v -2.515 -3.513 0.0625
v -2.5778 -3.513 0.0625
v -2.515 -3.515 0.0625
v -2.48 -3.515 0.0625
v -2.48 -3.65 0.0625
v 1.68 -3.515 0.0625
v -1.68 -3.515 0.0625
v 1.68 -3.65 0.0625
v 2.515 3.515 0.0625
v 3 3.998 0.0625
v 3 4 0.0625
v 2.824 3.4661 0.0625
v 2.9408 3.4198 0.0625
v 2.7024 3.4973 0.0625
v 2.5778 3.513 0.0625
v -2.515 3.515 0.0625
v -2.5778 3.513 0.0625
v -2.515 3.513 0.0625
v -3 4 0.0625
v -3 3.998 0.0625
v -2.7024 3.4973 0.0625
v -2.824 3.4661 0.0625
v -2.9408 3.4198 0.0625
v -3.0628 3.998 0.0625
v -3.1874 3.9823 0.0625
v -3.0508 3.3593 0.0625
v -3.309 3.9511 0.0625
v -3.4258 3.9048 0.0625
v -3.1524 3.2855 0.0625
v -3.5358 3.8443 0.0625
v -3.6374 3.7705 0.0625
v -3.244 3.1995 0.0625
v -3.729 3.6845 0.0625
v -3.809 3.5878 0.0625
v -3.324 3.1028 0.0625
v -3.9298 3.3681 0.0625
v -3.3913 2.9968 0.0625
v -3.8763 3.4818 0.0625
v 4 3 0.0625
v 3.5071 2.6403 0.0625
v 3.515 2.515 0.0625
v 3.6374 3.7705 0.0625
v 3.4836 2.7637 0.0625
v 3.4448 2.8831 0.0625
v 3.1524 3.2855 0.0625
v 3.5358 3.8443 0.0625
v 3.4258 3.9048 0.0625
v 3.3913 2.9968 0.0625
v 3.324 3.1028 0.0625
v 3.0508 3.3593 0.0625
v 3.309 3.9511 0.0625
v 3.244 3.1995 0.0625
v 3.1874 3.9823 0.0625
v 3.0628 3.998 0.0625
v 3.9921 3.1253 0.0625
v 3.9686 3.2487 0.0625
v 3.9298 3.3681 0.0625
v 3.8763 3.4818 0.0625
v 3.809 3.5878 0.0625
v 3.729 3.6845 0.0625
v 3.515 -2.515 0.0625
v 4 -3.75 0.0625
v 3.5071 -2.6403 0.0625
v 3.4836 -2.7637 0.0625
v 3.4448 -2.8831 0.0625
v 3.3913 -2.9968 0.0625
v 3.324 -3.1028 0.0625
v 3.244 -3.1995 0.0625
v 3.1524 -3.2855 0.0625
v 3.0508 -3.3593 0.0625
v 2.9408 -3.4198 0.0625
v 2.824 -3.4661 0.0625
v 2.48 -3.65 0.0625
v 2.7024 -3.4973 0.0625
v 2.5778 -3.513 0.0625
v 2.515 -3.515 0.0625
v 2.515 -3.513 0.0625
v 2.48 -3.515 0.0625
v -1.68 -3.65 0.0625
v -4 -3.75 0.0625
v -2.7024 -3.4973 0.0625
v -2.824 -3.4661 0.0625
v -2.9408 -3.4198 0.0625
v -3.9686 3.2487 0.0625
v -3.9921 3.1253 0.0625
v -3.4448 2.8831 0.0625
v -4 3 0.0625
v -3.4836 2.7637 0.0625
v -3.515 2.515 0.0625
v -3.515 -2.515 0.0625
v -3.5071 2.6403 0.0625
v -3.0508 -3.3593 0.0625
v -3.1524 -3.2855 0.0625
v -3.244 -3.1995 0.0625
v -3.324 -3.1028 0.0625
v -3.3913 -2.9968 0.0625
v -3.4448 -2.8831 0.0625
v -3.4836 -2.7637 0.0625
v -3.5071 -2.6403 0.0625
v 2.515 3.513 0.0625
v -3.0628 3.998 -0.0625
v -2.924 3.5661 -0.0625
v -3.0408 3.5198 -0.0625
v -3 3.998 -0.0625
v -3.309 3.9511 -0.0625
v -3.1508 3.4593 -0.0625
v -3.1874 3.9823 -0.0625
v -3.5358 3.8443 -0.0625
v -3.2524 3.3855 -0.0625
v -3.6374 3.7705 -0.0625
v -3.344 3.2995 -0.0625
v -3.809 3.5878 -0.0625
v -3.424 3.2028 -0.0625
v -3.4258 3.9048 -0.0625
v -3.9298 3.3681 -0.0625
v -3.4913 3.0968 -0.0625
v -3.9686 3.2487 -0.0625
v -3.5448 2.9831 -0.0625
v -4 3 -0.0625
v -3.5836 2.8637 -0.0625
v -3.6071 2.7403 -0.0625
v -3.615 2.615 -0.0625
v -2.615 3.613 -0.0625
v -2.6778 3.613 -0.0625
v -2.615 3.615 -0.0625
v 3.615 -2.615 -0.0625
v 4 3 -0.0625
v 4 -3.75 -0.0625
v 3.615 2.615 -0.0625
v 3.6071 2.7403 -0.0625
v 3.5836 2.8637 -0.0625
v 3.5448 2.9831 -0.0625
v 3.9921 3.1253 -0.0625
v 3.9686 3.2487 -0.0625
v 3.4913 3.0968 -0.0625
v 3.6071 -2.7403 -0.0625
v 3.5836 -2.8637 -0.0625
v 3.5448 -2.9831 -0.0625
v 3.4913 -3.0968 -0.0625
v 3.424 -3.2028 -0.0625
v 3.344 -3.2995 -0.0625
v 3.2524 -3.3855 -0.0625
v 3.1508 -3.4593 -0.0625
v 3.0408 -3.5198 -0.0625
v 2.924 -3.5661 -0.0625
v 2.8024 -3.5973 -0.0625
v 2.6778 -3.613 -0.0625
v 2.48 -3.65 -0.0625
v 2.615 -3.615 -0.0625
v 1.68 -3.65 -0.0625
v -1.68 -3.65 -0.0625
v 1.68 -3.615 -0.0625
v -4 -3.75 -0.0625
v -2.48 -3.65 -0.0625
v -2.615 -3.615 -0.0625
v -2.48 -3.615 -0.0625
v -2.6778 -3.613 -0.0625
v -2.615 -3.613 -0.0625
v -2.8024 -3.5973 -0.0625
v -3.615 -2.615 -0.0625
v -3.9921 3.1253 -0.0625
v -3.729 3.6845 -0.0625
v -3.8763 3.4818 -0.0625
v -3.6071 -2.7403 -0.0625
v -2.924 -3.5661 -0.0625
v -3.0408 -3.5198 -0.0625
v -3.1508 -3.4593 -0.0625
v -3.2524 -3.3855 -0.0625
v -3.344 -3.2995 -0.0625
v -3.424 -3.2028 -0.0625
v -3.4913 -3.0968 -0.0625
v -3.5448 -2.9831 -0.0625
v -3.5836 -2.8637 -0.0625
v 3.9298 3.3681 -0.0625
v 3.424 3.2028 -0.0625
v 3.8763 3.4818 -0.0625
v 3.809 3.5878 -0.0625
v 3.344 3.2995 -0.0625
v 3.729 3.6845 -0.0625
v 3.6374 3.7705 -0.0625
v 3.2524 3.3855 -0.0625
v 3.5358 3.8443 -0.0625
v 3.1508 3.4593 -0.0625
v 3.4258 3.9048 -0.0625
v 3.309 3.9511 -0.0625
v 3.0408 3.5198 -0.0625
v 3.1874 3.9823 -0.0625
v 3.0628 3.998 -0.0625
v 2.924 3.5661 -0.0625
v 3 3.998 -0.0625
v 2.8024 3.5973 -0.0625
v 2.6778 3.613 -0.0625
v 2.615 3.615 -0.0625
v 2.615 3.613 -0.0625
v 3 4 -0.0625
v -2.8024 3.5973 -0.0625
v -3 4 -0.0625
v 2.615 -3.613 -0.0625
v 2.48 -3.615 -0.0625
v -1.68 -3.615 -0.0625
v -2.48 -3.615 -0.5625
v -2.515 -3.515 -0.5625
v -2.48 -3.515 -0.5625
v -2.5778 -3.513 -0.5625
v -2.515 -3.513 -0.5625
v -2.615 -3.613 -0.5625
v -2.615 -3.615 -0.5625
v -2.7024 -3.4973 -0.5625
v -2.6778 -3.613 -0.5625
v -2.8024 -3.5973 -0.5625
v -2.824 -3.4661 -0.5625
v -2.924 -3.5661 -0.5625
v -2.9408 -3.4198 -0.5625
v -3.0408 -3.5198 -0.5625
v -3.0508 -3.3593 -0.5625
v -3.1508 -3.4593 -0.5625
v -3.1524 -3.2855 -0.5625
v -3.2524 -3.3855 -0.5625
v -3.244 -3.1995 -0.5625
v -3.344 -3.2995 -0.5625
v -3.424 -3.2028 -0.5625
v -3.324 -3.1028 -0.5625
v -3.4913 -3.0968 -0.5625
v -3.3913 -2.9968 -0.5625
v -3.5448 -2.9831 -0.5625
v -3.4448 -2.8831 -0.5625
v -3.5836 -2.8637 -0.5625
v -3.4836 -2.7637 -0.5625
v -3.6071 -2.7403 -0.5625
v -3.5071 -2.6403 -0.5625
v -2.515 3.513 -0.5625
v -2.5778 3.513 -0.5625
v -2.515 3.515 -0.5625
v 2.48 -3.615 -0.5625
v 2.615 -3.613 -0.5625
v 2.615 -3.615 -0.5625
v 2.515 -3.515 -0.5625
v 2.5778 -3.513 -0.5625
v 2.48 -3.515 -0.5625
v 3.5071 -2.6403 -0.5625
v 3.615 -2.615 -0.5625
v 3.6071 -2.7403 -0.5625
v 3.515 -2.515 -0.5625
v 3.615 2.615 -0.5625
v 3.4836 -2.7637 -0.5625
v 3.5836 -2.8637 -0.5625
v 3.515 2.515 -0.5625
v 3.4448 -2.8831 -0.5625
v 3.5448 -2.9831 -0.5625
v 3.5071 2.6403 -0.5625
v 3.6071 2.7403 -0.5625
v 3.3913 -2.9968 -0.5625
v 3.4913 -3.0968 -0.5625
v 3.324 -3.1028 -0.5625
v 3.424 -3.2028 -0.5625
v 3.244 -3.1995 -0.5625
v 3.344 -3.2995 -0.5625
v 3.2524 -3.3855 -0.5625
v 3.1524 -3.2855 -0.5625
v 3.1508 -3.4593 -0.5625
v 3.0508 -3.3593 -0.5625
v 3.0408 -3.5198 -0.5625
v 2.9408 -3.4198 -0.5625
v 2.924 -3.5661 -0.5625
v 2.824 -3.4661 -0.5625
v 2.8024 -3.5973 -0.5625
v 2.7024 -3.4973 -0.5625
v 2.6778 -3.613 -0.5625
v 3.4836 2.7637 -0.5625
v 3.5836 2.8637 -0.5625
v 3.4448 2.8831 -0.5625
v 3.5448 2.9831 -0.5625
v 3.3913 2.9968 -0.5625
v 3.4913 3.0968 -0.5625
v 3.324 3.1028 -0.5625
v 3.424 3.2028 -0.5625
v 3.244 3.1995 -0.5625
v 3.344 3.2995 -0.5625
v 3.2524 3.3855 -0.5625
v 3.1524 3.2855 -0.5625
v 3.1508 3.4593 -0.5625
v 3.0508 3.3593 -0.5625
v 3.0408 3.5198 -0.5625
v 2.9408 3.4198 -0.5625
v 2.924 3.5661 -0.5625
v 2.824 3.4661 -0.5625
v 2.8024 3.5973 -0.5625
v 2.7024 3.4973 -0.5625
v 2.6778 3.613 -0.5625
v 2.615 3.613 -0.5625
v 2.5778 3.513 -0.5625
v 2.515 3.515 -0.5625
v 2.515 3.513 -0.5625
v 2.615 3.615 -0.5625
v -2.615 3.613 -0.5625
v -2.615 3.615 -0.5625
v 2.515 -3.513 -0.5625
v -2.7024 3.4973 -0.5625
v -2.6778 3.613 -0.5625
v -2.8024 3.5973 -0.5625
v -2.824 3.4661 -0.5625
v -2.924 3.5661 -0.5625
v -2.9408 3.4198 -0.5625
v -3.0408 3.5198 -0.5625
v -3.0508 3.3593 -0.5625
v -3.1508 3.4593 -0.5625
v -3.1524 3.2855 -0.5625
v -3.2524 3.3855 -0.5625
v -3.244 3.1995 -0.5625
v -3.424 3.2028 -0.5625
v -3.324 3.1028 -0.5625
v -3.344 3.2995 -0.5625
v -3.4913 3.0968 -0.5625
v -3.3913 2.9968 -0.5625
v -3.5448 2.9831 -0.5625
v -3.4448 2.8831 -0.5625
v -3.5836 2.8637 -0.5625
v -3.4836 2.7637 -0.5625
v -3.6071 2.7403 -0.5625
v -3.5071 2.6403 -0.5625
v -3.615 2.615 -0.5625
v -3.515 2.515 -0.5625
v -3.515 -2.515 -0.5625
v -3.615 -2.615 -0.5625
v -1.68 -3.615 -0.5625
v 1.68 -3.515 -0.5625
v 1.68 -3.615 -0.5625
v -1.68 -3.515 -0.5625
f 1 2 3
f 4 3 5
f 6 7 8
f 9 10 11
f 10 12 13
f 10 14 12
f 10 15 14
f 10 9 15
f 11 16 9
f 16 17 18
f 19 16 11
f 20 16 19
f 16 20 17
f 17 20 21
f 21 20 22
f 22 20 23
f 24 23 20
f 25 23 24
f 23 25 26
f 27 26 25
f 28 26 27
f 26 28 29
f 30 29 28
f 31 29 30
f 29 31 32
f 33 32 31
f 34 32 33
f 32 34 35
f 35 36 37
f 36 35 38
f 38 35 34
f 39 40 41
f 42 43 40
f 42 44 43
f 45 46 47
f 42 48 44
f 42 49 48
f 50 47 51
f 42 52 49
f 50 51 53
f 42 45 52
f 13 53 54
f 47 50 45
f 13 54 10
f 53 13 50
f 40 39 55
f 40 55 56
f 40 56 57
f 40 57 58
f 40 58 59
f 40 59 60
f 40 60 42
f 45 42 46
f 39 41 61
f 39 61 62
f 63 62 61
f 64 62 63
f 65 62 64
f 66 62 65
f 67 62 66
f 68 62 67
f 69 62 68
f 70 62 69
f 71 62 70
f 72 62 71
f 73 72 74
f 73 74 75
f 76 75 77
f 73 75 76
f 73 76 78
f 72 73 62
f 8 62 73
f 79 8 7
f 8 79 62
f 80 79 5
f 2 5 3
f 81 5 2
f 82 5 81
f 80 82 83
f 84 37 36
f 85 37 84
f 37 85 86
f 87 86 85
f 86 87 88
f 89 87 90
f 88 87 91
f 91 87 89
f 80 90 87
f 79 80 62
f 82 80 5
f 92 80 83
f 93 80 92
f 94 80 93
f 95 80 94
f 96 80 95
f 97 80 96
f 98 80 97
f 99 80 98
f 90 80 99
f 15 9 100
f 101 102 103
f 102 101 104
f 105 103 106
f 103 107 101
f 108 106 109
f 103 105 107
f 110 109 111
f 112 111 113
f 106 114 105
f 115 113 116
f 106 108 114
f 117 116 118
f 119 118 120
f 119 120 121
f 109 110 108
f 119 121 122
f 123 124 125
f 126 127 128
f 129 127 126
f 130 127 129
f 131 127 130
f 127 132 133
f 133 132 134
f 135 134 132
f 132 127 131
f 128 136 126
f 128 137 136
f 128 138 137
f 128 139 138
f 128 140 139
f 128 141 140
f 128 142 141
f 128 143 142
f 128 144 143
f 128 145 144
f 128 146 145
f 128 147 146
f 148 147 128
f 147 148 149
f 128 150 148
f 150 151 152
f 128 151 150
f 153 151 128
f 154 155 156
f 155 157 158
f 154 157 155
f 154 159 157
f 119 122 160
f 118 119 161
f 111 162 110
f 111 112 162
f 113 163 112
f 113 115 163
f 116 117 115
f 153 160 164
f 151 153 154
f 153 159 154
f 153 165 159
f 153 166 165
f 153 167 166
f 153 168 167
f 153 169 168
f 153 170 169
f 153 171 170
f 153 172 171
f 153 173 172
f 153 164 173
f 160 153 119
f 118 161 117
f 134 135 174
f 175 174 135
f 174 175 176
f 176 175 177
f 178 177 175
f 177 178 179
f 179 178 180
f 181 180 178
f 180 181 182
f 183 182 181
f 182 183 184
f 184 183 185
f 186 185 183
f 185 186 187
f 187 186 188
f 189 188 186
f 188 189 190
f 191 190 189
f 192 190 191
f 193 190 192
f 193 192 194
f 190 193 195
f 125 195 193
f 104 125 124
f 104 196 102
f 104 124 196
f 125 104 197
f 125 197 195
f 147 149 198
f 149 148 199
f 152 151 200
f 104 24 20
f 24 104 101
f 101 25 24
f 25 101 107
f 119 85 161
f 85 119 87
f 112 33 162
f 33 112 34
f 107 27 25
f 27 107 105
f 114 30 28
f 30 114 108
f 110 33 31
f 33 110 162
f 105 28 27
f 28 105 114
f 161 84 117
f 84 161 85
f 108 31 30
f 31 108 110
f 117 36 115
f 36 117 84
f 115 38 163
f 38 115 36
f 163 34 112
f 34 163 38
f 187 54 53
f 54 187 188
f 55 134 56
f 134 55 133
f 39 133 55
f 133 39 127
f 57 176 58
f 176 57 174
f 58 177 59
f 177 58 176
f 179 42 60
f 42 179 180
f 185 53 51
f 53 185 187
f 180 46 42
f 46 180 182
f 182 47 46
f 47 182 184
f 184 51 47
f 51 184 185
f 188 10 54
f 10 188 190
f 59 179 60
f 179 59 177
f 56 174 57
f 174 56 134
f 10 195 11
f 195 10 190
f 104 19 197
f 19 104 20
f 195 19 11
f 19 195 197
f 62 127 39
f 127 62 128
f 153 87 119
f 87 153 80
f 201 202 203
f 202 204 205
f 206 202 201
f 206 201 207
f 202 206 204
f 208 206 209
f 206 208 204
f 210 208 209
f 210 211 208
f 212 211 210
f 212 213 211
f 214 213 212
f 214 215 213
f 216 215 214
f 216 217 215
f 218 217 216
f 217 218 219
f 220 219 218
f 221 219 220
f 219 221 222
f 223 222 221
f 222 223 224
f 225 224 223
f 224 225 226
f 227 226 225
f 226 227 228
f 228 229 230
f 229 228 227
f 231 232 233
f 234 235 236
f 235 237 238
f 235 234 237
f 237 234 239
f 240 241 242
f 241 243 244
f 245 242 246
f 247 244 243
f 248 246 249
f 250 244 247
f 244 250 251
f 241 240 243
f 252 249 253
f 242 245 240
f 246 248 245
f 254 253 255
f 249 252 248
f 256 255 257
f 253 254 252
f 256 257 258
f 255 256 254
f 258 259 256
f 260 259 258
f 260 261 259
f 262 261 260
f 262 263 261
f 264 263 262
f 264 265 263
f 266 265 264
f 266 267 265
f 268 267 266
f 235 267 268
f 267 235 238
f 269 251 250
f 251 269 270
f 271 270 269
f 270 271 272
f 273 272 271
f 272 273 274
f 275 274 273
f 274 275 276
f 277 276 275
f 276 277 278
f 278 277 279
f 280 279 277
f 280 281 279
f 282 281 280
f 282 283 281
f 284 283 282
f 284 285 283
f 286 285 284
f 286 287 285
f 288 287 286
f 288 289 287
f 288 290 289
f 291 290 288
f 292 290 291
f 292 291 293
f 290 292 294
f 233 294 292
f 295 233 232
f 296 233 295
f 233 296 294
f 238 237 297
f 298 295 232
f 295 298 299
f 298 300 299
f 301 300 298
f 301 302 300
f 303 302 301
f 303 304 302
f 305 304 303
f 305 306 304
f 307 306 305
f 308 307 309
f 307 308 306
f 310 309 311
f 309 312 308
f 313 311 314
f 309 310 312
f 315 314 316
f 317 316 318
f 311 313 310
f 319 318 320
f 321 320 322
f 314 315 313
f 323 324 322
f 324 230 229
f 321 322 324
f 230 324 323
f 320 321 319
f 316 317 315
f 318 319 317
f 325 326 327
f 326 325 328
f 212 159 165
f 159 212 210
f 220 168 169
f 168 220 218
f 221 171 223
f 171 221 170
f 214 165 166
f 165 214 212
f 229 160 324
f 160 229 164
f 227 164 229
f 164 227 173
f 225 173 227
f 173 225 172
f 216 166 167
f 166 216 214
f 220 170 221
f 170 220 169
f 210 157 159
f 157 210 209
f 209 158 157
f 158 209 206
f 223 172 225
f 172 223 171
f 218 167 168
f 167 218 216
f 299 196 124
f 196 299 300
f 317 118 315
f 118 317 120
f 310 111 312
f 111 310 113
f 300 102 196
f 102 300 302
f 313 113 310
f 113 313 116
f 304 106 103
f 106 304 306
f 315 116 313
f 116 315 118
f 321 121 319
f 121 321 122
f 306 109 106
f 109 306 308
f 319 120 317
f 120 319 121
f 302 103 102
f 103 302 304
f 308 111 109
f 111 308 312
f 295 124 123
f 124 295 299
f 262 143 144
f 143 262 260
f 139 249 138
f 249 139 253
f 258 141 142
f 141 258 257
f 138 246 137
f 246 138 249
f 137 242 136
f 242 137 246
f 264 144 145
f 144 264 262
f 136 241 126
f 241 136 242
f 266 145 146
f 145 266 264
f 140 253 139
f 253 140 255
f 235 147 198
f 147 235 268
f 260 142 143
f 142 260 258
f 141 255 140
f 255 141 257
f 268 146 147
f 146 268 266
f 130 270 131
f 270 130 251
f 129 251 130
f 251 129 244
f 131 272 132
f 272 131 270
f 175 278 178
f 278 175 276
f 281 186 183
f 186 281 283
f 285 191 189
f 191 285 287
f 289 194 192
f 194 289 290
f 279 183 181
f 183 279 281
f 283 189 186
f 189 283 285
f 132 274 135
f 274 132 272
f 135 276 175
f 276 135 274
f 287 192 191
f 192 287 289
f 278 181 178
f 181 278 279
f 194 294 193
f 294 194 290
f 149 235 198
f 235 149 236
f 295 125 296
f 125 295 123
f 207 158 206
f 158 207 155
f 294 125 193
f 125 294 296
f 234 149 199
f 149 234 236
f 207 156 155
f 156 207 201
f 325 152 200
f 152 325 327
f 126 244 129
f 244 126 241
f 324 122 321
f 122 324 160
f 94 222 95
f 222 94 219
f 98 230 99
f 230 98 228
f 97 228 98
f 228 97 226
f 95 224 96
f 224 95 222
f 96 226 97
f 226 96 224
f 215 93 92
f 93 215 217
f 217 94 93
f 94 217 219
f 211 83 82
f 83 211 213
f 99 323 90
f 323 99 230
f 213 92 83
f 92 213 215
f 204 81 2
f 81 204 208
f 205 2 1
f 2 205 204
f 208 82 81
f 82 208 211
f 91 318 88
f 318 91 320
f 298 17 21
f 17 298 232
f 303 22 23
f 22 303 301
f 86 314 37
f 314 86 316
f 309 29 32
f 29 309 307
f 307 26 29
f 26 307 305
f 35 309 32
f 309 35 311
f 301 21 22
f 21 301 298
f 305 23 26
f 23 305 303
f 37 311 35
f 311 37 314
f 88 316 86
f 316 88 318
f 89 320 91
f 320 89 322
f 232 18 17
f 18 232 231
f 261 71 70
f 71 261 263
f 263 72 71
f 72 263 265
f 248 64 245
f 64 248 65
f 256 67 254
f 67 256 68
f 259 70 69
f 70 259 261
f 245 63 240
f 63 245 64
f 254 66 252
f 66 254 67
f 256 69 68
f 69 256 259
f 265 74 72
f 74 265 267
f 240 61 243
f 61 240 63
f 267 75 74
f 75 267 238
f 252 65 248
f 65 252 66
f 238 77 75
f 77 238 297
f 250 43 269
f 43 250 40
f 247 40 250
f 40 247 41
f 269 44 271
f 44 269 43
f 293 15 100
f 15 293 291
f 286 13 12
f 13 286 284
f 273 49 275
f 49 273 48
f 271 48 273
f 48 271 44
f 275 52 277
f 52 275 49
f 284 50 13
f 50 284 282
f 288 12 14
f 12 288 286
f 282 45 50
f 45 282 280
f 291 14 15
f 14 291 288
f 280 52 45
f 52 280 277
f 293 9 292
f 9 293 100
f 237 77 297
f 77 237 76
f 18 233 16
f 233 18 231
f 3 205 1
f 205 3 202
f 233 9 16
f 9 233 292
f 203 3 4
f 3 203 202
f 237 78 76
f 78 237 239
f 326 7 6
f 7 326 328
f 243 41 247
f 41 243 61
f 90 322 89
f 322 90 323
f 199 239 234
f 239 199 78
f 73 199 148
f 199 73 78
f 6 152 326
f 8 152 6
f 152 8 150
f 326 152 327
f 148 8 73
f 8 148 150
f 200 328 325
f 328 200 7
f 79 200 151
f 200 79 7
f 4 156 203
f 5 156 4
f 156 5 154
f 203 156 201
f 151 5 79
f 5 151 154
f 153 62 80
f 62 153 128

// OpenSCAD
use <MCAD/boxes.scad>

$fn = 50;

cornerRadius = 1.0;


difference()
{
    union()
    {
        translate([0, -0.5, 0])
        roundedBox([8,9,0.125], cornerRadius, true );
        
        translate([0,0,-0.25])
        roundedBox([7.23, 7.23, 0.625], cornerRadius, true );
    }
    
    translate([0,0,-0.5])
    roundedBox([7.03, 7.03, 2.0], cornerRadius, true );
    
    translate([2.08,-3.4,-0.5])
    cube([0.8,0.5,2.0], true );
    
    translate([-2.08,-3.4,-0.5])
    cube([0.8,0.5,2.0], true );

    translate([0,-4.75,0])
    cube([10,2,1], true );
}
